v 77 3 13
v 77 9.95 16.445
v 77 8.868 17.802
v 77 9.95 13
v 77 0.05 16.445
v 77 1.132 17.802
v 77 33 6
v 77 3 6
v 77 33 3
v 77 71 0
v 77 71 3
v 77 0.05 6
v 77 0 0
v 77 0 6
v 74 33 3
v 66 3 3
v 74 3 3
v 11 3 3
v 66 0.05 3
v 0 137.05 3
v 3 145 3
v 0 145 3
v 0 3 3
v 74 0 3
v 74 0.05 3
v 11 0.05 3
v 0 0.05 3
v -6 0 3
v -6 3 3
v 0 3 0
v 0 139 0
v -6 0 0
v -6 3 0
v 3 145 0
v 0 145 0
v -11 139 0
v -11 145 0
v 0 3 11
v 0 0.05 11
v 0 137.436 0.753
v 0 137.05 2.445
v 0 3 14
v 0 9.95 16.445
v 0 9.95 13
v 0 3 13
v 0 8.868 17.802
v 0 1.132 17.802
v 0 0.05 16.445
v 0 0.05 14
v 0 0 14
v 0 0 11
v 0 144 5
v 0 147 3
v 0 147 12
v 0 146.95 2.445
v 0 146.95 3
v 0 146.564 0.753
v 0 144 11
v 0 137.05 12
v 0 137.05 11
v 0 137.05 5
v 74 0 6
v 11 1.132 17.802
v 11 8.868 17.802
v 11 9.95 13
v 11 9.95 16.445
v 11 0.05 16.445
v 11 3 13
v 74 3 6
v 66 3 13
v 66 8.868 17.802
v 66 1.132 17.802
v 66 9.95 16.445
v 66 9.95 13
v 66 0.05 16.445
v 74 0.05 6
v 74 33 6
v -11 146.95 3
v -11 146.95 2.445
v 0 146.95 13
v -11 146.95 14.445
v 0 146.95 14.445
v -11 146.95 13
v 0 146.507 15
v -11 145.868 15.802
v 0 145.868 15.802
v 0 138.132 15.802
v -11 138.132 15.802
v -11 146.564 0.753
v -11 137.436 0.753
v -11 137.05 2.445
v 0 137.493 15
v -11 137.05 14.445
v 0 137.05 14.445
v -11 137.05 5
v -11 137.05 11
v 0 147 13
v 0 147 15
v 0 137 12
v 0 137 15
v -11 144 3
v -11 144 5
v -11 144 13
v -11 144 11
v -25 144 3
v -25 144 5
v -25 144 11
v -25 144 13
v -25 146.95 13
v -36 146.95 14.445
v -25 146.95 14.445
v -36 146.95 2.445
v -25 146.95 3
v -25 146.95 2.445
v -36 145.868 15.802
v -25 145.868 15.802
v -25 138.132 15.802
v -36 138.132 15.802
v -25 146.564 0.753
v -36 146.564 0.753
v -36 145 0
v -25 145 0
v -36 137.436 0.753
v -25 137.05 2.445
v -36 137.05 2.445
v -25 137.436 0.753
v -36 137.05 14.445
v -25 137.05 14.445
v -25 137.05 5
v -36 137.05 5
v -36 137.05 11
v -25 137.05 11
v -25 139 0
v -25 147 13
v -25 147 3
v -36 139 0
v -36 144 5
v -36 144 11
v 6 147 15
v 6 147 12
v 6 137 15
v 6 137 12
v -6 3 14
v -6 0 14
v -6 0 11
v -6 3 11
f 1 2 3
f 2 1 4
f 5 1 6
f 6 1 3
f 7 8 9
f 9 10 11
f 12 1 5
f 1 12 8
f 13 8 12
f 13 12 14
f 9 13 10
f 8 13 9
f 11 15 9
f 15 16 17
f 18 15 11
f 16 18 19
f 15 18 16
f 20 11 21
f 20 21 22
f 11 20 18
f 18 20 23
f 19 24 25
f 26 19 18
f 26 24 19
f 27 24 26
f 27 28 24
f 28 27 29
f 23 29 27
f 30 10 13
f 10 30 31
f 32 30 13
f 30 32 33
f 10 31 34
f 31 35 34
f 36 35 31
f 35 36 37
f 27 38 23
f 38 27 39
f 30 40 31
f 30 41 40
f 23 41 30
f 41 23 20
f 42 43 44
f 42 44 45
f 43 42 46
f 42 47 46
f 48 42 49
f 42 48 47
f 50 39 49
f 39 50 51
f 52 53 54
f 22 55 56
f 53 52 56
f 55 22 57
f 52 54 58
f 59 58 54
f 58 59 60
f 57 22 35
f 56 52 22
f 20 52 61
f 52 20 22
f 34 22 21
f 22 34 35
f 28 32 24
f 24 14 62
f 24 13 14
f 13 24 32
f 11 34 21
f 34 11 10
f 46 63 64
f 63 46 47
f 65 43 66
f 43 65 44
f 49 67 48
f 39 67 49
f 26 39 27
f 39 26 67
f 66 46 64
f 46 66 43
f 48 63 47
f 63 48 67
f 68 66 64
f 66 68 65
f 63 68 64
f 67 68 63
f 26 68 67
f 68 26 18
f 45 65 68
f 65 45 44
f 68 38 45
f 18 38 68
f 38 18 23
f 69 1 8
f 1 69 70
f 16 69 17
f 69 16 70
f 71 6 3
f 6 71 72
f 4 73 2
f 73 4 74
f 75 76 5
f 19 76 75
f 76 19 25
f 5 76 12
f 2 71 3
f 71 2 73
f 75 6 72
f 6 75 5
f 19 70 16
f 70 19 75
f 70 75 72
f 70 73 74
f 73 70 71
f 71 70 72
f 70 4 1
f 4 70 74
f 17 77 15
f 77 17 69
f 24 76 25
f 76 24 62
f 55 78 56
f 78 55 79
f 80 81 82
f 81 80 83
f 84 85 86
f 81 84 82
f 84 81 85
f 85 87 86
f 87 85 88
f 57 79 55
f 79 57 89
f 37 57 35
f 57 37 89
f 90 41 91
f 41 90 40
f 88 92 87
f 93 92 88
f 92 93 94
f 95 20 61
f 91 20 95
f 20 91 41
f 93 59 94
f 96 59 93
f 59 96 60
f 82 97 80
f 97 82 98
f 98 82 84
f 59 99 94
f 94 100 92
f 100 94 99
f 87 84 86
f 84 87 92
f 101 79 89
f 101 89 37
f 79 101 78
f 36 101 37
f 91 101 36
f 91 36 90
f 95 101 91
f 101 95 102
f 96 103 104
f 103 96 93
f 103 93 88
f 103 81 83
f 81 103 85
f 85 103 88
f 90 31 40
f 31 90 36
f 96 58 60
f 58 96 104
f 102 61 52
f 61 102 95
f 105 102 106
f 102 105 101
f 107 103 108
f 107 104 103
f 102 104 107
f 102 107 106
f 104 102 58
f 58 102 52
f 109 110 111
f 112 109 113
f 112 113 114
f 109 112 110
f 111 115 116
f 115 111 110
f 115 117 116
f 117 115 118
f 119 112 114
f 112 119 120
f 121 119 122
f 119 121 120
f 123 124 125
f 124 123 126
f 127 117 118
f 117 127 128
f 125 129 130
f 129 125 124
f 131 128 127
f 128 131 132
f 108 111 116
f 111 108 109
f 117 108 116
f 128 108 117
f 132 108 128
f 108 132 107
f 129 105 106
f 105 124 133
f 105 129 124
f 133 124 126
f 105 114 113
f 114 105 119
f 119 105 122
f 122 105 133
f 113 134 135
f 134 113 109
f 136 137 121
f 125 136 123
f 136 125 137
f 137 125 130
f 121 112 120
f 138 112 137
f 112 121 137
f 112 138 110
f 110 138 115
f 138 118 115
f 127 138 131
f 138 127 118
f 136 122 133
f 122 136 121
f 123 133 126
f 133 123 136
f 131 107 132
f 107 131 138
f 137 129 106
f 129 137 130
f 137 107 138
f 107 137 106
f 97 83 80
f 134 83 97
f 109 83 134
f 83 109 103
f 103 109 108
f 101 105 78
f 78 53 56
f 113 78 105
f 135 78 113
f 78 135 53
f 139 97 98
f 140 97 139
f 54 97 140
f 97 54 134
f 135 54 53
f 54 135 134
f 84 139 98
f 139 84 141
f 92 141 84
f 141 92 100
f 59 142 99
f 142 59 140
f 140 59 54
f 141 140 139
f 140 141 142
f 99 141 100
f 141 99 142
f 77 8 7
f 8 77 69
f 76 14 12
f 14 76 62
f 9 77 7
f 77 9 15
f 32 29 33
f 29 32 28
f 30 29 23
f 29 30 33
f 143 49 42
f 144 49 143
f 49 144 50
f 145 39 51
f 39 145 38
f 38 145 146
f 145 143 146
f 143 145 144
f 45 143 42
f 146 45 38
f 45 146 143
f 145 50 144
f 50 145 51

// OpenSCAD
/* [Phone details] */
// Enter width of your phone in mm
phone_width = 74;
// Enter height of your phone in mm
phone_height = 142;
// Enter thickness of your phone in mm
phone_thickness = 6;
// Enter the thickness of your computer monitor on the upper side

/* [Monitor details] */
monitor_thickness_upper = 6;
// Enter the thickness of your computer monitor on the right side and your phone_height down
monitor_thickness_side = 8;
// Distance between the two clamps on the computer monitor in mm
monitor_clamp_distance = 25;

/* [Other settings] */
// Specify the roundness of edges
edge = 4; // [0,2,4,6]
// Specify the thickness of walls in mm
wall = 3; // [1,2,3,4]
// Width of a single clamp
cw = 10; // [10,15,20]



difference(){
    cube([phone_width+wall,phone_height+wall,wall]);
    translate([phone_width+wall,phone_height/2,0])
        rotate([0,0,45])
        cube([phone_width+wall,phone_height+wall,wall]);
}
translate([phone_width,0,wall])
    cube([wall,30+wall,wall]);

difference(){
    union(){
        clamp(monitor_thickness_side);
        translate([phone_width-2*wall-edge/2,0,0])
            clamp(monitor_thickness_side);
    }
    translate([0,wall,wall])
    cube([phone_width,phone_height,phone_thickness]);
}

translate([-2*wall,0,0])
    cube([2*wall,wall,wall]);

translate([-2*wall,0,monitor_thickness_side+wall])
    cube([2*wall,wall,wall]);


translate([0,phone_height+wall+edge/2,0])
rotate([180,180,0]){
    clamp(monitor_thickness_upper);
    translate([monitor_clamp_distance,0,0])
        clamp(monitor_thickness_upper);
    translate([0,0,monitor_thickness_upper-wall])
    cube([monitor_clamp_distance,wall,monitor_thickness_upper+edge]);
    translate([-2*wall,0,phone_thickness+2*wall])
        cube([2*wall,cw,wall]);
}
//monitor_clamp_distance+cw,0,
module clamp(ch){
    translate([0,edge/2,edge/2]){
        difference(){
            minkowski(){
                cube([cw,cw-edge,ch+2*wall]);
                rotate([0,90,0])
                    cylinder(r=edge/2,h=1);
            }
            translate([-1,wall-edge/2,wall])
                cube([2*cw,cw,ch]);
        }
    }
}
